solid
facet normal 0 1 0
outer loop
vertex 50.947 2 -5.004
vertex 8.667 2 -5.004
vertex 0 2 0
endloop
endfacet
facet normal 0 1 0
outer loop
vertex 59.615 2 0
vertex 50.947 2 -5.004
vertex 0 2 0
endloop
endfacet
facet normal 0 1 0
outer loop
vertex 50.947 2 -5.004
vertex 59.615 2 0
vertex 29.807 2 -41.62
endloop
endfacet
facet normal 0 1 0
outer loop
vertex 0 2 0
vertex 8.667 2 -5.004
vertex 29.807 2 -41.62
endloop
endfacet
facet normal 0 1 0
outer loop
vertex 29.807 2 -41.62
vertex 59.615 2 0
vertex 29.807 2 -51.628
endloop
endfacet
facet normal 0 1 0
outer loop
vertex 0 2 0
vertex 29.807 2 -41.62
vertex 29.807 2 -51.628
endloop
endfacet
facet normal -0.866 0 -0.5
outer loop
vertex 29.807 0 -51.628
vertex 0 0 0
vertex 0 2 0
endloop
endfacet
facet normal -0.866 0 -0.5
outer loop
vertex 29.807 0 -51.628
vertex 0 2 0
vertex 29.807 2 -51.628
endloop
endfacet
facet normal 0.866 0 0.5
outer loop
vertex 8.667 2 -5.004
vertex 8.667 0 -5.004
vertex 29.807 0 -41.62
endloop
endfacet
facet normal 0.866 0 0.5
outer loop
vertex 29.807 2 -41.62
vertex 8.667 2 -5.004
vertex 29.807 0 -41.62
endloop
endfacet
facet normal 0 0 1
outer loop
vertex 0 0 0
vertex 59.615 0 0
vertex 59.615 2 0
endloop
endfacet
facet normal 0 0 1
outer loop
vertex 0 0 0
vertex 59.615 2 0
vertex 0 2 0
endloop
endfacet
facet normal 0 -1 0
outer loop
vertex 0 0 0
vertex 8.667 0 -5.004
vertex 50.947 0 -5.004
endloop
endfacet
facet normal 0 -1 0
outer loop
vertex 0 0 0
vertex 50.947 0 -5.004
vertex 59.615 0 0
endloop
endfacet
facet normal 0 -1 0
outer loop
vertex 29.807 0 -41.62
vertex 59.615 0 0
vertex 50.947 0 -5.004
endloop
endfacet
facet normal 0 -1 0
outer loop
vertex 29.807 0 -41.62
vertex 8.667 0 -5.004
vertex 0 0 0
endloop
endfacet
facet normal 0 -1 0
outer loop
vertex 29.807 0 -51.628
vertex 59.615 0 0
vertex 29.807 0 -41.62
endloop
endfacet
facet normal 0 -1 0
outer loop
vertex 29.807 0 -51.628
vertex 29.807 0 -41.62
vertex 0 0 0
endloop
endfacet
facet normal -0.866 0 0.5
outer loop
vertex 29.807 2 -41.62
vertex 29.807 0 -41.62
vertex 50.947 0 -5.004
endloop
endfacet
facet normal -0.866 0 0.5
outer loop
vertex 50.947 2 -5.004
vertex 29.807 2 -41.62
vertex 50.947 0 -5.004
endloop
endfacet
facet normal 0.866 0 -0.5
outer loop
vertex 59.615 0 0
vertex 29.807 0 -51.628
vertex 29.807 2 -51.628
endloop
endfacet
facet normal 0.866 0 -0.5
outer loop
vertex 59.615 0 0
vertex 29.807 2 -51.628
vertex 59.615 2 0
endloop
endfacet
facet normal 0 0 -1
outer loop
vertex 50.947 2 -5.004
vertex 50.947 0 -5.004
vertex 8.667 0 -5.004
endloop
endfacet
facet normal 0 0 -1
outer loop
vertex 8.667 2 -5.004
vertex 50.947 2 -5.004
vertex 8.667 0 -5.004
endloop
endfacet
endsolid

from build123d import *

# Parameters (mm, degrees)
BOSS_EXTRUDE1_DEPTH = 2


with BuildPart() as part:
    # Sketch1 → Boss-Extrude1 (new body)
    with BuildSketch(Plane(origin=(0, 0, 0), x_dir=(1, 0, 0), z_dir=(0, 1, 0))):
        Polygon((0, 0), (29.8074, 51.627931242), (59.6148, 0), align=None)
        Polygon((50.9474, 5.004125723), (8.6674, 5.004125723), (29.8074, 41.619679795), align=None, mode=Mode.SUBTRACT)
    extrude(amount=BOSS_EXTRUDE1_DEPTH)


solid = part.part
